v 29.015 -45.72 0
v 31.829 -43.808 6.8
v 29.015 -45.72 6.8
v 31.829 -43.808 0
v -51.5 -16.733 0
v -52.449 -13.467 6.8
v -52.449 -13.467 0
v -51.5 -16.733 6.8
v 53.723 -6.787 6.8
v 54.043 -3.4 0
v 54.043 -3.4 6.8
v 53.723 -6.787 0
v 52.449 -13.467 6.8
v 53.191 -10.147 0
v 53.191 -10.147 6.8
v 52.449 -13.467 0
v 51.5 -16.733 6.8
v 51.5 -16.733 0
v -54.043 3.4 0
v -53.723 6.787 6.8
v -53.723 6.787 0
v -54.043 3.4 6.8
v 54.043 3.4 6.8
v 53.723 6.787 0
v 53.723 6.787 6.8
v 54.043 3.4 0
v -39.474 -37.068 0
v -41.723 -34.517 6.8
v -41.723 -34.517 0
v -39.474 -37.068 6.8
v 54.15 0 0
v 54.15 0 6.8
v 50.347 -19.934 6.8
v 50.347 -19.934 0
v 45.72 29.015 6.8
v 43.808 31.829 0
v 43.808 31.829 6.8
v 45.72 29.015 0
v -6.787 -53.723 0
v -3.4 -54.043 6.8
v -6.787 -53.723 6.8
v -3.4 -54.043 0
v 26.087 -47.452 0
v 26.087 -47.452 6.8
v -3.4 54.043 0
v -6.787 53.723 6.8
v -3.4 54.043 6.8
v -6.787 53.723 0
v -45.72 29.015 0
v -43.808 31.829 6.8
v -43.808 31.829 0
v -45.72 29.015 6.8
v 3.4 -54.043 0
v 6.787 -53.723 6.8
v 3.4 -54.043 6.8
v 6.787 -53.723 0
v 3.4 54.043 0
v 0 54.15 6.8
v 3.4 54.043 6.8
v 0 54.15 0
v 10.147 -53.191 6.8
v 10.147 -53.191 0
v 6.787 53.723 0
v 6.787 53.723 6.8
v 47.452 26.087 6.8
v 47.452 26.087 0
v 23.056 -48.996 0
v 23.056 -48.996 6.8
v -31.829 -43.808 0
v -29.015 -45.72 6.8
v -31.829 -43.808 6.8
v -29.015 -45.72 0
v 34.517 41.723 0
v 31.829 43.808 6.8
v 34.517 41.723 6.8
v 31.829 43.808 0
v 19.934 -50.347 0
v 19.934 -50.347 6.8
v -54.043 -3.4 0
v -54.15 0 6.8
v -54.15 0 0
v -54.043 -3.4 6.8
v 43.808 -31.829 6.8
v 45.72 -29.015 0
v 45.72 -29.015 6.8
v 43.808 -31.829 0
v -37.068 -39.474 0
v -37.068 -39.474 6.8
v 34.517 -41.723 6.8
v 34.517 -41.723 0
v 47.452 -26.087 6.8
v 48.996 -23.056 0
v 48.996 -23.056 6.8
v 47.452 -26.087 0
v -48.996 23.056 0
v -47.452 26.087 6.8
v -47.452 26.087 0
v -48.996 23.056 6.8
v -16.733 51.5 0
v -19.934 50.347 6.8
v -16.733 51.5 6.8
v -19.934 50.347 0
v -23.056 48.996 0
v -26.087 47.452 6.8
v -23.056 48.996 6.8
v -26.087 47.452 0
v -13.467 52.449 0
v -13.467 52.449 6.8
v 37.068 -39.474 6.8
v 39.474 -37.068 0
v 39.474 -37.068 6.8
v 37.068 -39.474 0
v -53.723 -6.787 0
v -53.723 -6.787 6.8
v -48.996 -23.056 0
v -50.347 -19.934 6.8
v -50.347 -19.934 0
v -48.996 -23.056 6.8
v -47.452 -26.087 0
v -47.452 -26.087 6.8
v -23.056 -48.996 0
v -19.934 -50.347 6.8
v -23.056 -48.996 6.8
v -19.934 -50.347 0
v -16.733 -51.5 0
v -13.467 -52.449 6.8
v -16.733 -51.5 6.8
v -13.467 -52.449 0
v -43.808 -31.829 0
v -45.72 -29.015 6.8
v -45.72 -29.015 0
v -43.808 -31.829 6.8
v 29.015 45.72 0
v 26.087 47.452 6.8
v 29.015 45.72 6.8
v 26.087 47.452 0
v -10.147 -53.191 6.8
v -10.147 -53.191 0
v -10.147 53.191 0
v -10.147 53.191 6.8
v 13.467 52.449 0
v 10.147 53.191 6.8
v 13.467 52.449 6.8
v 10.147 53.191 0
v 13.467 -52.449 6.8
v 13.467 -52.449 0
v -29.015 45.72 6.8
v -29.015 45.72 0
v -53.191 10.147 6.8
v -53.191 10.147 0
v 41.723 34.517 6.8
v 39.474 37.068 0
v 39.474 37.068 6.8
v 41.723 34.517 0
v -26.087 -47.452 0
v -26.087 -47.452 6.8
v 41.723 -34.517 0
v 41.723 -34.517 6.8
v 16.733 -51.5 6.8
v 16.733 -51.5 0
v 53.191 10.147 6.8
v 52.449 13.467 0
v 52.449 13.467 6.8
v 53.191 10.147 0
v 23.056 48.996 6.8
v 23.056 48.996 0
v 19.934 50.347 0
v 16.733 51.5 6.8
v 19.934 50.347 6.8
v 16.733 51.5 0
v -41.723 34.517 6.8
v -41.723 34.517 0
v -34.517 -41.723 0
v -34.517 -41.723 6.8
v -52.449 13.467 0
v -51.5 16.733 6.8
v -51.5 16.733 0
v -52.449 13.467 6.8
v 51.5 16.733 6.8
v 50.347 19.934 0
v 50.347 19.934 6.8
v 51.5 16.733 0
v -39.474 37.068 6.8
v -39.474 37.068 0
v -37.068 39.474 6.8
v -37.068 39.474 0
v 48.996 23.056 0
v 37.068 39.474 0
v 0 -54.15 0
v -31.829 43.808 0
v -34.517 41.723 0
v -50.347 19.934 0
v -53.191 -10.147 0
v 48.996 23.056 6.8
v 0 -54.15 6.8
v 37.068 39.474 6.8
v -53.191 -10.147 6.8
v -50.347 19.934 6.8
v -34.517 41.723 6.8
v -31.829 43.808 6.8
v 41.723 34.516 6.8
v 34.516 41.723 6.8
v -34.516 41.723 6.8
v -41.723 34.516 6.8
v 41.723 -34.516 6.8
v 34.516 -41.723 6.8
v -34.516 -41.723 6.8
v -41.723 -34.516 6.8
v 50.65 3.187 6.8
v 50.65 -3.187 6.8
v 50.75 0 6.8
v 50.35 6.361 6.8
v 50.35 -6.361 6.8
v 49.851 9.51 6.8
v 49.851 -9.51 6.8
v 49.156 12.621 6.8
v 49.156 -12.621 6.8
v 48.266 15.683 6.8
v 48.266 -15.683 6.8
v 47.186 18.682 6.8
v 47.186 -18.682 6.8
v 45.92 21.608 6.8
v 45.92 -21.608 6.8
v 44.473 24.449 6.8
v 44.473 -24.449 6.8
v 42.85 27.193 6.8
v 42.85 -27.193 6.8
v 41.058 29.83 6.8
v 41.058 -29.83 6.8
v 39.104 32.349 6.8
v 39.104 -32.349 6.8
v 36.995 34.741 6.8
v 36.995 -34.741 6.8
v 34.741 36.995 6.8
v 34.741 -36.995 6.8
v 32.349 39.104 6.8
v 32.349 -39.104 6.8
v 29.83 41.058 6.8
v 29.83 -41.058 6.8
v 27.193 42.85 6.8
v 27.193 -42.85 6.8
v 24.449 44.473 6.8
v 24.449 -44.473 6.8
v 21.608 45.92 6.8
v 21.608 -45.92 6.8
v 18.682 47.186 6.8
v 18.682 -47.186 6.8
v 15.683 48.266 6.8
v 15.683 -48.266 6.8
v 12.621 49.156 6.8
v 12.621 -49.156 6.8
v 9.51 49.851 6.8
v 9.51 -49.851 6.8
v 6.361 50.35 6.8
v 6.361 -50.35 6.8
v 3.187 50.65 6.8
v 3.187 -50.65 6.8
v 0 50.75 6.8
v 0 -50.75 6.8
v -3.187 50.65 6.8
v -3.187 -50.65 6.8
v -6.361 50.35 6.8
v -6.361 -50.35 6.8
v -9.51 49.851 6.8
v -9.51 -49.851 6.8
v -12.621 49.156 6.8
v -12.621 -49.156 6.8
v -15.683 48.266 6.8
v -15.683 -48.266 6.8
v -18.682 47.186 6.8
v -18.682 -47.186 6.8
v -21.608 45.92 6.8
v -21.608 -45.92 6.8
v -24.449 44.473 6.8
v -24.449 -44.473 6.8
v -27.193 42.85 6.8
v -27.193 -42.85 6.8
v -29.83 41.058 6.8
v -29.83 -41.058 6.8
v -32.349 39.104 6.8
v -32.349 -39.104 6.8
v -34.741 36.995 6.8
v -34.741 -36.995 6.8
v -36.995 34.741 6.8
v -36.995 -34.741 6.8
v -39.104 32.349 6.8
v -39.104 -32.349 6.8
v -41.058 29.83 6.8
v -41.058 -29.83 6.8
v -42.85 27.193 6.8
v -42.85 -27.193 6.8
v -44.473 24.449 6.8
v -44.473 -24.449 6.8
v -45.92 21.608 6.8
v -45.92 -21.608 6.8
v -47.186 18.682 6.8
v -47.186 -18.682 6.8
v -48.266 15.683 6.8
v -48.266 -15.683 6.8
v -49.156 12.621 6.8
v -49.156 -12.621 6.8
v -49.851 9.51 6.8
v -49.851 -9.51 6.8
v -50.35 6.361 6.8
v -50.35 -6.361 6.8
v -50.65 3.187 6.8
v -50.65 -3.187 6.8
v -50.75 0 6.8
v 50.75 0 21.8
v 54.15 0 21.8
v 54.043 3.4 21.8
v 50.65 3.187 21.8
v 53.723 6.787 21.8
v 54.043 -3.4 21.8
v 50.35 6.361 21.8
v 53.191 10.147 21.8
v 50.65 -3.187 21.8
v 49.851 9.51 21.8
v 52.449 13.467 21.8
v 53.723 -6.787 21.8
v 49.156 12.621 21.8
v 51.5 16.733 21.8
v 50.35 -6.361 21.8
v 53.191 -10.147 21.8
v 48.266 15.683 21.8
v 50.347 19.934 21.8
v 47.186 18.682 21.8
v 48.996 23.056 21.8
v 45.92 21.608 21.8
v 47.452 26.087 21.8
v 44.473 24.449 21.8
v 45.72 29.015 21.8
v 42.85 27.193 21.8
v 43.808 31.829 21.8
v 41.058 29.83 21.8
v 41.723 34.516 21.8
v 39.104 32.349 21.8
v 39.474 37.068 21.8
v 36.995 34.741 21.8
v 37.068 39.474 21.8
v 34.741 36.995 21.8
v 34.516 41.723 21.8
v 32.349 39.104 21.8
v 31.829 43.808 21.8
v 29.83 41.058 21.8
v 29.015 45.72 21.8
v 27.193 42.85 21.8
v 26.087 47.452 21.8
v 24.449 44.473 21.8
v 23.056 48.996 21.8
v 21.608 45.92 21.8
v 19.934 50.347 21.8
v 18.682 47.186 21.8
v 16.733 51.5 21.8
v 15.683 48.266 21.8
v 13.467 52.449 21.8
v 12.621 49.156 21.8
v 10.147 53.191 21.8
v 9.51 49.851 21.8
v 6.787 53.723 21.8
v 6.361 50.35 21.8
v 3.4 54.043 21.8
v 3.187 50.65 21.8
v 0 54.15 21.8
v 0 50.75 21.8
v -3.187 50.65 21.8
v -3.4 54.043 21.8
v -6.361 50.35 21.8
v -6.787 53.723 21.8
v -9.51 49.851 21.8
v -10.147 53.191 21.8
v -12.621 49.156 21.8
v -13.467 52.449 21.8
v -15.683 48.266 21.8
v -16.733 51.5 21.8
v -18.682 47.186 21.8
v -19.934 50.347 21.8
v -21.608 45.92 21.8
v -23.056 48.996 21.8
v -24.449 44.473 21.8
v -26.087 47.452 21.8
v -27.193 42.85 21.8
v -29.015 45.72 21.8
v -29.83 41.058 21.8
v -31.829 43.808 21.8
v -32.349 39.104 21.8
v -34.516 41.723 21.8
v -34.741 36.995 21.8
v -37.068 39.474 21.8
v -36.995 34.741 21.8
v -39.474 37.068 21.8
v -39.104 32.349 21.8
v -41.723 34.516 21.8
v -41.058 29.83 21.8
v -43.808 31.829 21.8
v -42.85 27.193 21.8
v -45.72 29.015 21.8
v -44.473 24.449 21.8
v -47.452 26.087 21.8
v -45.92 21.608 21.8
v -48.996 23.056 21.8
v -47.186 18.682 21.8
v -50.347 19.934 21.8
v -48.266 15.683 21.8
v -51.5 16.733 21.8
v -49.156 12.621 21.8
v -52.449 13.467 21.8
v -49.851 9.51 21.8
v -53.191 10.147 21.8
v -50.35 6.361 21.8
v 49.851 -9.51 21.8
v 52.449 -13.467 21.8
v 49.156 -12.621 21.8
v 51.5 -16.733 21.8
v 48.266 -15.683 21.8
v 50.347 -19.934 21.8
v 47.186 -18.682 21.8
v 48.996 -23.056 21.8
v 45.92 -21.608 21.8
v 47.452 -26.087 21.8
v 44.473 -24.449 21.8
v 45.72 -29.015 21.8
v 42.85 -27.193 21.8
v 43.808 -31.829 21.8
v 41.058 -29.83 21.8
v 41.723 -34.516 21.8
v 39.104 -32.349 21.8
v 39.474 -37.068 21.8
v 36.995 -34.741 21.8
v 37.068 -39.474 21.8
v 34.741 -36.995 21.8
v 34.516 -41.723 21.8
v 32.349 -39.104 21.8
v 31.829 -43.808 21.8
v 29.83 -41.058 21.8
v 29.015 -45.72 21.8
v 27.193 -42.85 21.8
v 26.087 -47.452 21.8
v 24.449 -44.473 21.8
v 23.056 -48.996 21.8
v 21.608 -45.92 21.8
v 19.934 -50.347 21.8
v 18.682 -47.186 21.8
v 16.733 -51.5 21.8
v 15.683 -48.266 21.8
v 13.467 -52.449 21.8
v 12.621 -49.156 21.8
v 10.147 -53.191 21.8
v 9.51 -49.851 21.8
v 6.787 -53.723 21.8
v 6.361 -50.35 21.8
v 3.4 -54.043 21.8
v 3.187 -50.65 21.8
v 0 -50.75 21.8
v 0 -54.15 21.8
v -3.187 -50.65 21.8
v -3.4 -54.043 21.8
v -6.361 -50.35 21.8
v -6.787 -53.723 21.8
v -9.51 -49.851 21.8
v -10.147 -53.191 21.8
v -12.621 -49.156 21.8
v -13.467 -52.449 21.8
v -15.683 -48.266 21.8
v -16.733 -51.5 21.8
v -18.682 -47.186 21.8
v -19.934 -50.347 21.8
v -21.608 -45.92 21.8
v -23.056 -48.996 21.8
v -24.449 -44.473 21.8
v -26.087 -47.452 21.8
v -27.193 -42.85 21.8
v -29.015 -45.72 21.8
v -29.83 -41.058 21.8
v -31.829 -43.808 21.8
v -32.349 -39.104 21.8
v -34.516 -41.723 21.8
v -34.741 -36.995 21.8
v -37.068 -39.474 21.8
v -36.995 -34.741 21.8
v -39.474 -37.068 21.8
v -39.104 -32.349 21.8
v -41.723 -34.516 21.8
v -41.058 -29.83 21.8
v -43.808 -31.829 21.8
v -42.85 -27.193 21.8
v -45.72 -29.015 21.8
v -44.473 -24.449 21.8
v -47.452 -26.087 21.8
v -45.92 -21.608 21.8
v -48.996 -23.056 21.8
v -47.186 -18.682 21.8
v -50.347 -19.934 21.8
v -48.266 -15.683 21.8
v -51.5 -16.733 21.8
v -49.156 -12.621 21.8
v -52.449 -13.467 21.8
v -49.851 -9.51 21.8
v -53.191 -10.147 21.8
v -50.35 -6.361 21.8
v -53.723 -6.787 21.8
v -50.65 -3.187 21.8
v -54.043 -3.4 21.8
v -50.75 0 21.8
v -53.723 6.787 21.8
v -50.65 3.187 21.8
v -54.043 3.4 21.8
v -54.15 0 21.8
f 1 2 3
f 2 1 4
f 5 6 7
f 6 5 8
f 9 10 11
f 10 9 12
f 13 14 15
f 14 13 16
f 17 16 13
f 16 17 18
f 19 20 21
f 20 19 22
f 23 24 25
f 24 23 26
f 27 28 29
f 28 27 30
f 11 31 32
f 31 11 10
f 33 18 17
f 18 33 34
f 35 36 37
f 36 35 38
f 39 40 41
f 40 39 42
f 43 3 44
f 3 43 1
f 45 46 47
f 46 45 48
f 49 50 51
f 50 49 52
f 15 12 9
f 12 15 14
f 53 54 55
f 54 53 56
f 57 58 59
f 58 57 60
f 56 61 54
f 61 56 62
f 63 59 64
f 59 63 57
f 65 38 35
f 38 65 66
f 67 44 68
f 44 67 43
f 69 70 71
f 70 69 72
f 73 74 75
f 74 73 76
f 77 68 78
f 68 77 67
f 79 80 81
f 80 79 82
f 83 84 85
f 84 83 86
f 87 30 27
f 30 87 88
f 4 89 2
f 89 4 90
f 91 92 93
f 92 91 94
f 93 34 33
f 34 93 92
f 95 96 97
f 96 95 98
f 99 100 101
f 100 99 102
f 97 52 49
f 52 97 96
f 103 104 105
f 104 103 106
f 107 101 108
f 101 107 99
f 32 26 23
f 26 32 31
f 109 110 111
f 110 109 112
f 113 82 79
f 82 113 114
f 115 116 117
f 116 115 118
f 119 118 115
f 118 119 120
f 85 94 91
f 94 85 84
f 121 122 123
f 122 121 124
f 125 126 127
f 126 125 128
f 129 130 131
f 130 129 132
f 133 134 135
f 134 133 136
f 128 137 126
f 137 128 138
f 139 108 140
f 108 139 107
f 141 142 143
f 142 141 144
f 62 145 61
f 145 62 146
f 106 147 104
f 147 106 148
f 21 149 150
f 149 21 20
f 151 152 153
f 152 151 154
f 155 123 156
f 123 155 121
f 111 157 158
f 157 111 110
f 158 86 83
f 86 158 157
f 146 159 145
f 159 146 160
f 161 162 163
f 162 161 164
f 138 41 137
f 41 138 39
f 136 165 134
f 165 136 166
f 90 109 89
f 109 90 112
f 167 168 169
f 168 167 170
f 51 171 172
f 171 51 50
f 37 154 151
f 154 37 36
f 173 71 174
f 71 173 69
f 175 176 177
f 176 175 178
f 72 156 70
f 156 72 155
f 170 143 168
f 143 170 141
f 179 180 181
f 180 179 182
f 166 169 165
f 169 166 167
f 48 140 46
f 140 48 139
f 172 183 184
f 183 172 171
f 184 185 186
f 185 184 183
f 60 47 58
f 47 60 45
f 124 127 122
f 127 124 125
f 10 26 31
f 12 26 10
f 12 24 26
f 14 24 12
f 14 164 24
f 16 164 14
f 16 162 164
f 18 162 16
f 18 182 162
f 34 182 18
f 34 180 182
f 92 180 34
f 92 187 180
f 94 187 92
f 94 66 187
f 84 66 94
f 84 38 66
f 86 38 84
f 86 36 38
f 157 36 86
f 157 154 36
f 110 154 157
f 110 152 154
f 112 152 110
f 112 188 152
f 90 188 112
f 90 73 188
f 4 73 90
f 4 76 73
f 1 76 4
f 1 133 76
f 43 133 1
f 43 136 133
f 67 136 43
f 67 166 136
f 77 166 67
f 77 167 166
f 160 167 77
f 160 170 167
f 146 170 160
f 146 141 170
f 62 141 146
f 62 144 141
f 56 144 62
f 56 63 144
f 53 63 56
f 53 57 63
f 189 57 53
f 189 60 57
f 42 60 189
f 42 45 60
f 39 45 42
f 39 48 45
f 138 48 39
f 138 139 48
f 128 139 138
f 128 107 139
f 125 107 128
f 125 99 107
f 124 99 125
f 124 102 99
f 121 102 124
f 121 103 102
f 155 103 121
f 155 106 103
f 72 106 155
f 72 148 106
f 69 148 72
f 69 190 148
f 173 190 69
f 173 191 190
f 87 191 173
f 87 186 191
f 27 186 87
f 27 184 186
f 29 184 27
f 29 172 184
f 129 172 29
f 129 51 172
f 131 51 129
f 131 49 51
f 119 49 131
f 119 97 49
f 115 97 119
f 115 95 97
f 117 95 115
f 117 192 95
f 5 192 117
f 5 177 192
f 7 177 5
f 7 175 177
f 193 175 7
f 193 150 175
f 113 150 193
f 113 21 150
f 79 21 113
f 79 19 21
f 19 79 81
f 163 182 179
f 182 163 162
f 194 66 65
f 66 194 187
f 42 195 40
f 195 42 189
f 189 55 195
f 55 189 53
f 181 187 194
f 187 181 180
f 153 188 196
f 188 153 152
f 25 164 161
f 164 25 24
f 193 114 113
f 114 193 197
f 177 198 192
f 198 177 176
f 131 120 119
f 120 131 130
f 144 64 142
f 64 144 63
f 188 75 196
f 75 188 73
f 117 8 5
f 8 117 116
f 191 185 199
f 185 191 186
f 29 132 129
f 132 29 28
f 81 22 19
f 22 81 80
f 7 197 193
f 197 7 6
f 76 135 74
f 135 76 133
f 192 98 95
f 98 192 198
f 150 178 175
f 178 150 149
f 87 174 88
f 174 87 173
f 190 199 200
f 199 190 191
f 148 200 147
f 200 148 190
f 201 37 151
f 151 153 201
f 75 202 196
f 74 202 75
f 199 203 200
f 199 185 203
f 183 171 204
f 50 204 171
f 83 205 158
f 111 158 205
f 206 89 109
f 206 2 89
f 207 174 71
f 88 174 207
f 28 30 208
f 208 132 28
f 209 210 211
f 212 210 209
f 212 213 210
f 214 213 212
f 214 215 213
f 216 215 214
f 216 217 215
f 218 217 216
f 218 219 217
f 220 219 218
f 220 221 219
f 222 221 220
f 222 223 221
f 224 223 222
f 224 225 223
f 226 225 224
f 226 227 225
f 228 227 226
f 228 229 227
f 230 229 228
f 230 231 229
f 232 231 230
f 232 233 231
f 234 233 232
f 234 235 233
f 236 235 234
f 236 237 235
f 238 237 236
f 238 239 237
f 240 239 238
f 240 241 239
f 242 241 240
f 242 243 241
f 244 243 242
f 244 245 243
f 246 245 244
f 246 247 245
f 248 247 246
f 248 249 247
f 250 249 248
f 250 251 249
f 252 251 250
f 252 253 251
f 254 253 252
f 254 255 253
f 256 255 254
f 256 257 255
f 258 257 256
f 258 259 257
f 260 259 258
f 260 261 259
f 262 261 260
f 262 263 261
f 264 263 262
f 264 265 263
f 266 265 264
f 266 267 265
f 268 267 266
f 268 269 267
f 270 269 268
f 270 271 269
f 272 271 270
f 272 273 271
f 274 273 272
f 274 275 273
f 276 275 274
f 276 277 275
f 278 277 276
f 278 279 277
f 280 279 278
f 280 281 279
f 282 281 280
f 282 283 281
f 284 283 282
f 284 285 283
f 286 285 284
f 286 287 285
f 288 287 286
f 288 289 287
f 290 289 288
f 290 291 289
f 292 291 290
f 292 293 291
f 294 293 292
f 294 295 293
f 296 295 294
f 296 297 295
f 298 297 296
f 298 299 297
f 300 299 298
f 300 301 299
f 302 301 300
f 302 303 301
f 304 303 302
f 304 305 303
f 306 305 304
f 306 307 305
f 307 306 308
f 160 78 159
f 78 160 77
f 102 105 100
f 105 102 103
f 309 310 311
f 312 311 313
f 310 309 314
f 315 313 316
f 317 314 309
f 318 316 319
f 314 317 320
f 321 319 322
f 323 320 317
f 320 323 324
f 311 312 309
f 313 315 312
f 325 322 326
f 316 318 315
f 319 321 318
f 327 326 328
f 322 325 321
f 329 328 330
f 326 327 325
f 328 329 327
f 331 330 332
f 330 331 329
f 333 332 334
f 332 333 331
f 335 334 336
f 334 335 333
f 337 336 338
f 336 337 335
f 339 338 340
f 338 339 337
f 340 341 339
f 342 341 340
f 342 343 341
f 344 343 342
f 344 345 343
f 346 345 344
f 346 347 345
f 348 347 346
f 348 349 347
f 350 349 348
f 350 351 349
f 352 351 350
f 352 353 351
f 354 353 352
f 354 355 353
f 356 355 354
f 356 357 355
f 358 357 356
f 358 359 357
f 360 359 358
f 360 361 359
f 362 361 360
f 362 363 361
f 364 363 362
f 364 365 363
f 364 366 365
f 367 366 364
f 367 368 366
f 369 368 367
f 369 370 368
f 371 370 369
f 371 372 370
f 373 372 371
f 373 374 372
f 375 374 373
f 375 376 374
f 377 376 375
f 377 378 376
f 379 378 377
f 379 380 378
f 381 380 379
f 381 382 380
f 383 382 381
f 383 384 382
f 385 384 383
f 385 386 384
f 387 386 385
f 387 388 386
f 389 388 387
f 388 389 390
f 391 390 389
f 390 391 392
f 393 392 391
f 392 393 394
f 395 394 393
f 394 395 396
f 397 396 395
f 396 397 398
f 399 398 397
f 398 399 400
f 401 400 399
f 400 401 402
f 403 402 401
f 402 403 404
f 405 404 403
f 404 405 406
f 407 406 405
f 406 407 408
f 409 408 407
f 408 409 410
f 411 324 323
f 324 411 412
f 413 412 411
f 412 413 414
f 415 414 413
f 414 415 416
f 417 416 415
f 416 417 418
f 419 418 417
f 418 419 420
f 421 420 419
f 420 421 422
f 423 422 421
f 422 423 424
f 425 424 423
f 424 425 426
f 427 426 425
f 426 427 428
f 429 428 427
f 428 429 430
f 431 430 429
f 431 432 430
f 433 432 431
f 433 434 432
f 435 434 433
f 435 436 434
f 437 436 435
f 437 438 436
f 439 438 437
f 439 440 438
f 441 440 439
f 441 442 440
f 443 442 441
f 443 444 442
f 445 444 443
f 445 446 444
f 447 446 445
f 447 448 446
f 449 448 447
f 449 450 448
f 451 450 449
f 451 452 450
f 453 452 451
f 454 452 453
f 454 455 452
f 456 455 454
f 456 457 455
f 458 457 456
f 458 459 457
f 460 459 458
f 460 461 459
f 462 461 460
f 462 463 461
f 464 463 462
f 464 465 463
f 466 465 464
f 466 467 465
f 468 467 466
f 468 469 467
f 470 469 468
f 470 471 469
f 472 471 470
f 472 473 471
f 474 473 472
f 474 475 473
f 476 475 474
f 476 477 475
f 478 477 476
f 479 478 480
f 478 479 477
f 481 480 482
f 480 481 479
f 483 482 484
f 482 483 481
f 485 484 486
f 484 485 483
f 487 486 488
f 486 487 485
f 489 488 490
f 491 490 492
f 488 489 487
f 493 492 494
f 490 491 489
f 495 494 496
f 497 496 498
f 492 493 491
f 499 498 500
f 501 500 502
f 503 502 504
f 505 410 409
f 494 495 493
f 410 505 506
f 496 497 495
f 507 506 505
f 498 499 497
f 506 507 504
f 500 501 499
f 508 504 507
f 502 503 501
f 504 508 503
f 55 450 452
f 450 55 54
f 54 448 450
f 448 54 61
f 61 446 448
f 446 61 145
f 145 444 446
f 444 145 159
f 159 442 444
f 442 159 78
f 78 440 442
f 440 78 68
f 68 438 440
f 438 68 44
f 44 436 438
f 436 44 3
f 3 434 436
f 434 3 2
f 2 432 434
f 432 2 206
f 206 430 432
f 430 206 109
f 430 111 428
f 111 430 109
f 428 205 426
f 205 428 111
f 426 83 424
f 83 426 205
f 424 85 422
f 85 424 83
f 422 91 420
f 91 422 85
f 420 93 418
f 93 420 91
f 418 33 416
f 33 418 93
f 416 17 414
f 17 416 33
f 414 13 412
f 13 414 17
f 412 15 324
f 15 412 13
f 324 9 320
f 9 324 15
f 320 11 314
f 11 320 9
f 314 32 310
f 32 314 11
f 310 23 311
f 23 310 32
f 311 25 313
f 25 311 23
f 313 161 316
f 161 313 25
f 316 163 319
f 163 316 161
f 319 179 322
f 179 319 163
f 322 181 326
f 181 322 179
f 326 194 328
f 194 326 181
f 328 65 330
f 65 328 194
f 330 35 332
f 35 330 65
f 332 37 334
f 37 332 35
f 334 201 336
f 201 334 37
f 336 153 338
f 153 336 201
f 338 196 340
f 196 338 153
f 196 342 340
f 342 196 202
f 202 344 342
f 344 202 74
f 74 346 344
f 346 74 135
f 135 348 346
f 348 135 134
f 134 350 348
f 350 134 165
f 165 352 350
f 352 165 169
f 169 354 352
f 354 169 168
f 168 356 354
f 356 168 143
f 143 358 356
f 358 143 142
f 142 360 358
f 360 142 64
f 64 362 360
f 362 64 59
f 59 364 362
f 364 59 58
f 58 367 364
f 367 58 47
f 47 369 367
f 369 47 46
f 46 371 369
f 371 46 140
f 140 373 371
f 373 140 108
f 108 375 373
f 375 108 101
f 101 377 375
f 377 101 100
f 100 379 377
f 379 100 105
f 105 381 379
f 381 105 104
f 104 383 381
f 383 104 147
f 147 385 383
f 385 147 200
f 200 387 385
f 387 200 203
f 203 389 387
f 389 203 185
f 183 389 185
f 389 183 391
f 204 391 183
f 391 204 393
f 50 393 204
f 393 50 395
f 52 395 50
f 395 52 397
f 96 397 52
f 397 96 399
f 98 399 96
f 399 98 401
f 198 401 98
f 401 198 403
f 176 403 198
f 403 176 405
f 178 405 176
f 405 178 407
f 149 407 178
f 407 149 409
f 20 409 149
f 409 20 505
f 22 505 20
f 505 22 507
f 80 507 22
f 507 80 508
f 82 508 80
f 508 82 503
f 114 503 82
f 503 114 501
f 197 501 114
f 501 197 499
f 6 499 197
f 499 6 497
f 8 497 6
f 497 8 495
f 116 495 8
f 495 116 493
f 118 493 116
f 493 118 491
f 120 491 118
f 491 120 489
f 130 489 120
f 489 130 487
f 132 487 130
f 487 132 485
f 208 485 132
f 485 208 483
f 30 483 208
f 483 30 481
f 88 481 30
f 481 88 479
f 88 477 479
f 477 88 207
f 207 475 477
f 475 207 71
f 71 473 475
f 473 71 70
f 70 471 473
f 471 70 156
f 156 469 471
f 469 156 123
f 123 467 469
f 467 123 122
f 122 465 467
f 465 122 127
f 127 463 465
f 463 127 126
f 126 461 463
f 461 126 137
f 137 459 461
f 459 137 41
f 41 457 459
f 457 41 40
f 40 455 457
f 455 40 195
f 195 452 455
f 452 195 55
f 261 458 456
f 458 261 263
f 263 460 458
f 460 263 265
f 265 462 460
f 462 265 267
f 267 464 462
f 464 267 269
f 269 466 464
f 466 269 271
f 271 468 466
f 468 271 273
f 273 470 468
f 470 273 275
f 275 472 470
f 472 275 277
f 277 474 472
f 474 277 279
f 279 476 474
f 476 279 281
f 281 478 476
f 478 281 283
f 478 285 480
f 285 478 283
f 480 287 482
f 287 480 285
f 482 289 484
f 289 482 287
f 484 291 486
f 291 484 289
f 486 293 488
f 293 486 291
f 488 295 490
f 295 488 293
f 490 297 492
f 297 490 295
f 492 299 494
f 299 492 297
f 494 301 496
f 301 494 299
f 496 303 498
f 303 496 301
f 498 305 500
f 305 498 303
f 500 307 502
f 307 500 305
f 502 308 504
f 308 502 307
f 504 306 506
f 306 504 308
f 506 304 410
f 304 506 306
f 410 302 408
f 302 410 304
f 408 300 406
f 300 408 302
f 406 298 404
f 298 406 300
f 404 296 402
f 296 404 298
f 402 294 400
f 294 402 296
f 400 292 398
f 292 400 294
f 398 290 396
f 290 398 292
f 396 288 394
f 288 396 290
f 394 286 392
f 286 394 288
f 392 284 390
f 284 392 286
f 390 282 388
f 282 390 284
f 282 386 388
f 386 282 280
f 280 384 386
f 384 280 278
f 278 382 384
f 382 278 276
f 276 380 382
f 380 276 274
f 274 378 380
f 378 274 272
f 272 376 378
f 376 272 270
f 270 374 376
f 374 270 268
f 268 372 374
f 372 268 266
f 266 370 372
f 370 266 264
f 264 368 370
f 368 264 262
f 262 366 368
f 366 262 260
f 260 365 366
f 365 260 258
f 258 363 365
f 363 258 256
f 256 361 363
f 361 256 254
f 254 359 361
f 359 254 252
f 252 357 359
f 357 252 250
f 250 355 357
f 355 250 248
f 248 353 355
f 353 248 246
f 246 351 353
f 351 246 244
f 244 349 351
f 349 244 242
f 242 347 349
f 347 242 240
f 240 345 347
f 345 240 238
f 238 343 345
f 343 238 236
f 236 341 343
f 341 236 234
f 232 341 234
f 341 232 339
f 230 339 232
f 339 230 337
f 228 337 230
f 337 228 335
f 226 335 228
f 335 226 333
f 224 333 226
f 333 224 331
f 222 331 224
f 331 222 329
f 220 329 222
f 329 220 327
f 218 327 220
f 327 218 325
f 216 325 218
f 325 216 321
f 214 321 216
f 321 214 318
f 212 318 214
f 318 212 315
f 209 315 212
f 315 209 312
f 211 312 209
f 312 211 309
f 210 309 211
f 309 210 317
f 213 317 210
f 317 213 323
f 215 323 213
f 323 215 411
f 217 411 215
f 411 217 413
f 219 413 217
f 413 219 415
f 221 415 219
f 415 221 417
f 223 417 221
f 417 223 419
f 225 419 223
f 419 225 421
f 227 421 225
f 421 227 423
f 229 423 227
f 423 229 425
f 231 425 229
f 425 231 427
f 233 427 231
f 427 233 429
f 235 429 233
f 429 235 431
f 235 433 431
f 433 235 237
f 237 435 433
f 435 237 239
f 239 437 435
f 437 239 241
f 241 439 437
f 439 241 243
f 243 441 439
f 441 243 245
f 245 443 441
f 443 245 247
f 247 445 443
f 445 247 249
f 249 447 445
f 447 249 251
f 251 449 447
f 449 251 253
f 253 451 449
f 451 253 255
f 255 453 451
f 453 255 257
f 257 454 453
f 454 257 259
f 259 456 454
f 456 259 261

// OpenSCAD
$fn = 100;

wall = 6.8;
id = 101.5;
od = id + wall;
h = 15;

module grid() {
  translate([0, 0, wall / 2])
    import("../opengrid/opengrid-2x2.3mf", center=true);
}

grid();
difference() {
  linear_extrude(wall) circle(d=od);
  hull() grid();
}

translate([0, 0, 6.8])
  linear_extrude(h) difference() {
      circle(d=od);
      circle(d=id);
    }
